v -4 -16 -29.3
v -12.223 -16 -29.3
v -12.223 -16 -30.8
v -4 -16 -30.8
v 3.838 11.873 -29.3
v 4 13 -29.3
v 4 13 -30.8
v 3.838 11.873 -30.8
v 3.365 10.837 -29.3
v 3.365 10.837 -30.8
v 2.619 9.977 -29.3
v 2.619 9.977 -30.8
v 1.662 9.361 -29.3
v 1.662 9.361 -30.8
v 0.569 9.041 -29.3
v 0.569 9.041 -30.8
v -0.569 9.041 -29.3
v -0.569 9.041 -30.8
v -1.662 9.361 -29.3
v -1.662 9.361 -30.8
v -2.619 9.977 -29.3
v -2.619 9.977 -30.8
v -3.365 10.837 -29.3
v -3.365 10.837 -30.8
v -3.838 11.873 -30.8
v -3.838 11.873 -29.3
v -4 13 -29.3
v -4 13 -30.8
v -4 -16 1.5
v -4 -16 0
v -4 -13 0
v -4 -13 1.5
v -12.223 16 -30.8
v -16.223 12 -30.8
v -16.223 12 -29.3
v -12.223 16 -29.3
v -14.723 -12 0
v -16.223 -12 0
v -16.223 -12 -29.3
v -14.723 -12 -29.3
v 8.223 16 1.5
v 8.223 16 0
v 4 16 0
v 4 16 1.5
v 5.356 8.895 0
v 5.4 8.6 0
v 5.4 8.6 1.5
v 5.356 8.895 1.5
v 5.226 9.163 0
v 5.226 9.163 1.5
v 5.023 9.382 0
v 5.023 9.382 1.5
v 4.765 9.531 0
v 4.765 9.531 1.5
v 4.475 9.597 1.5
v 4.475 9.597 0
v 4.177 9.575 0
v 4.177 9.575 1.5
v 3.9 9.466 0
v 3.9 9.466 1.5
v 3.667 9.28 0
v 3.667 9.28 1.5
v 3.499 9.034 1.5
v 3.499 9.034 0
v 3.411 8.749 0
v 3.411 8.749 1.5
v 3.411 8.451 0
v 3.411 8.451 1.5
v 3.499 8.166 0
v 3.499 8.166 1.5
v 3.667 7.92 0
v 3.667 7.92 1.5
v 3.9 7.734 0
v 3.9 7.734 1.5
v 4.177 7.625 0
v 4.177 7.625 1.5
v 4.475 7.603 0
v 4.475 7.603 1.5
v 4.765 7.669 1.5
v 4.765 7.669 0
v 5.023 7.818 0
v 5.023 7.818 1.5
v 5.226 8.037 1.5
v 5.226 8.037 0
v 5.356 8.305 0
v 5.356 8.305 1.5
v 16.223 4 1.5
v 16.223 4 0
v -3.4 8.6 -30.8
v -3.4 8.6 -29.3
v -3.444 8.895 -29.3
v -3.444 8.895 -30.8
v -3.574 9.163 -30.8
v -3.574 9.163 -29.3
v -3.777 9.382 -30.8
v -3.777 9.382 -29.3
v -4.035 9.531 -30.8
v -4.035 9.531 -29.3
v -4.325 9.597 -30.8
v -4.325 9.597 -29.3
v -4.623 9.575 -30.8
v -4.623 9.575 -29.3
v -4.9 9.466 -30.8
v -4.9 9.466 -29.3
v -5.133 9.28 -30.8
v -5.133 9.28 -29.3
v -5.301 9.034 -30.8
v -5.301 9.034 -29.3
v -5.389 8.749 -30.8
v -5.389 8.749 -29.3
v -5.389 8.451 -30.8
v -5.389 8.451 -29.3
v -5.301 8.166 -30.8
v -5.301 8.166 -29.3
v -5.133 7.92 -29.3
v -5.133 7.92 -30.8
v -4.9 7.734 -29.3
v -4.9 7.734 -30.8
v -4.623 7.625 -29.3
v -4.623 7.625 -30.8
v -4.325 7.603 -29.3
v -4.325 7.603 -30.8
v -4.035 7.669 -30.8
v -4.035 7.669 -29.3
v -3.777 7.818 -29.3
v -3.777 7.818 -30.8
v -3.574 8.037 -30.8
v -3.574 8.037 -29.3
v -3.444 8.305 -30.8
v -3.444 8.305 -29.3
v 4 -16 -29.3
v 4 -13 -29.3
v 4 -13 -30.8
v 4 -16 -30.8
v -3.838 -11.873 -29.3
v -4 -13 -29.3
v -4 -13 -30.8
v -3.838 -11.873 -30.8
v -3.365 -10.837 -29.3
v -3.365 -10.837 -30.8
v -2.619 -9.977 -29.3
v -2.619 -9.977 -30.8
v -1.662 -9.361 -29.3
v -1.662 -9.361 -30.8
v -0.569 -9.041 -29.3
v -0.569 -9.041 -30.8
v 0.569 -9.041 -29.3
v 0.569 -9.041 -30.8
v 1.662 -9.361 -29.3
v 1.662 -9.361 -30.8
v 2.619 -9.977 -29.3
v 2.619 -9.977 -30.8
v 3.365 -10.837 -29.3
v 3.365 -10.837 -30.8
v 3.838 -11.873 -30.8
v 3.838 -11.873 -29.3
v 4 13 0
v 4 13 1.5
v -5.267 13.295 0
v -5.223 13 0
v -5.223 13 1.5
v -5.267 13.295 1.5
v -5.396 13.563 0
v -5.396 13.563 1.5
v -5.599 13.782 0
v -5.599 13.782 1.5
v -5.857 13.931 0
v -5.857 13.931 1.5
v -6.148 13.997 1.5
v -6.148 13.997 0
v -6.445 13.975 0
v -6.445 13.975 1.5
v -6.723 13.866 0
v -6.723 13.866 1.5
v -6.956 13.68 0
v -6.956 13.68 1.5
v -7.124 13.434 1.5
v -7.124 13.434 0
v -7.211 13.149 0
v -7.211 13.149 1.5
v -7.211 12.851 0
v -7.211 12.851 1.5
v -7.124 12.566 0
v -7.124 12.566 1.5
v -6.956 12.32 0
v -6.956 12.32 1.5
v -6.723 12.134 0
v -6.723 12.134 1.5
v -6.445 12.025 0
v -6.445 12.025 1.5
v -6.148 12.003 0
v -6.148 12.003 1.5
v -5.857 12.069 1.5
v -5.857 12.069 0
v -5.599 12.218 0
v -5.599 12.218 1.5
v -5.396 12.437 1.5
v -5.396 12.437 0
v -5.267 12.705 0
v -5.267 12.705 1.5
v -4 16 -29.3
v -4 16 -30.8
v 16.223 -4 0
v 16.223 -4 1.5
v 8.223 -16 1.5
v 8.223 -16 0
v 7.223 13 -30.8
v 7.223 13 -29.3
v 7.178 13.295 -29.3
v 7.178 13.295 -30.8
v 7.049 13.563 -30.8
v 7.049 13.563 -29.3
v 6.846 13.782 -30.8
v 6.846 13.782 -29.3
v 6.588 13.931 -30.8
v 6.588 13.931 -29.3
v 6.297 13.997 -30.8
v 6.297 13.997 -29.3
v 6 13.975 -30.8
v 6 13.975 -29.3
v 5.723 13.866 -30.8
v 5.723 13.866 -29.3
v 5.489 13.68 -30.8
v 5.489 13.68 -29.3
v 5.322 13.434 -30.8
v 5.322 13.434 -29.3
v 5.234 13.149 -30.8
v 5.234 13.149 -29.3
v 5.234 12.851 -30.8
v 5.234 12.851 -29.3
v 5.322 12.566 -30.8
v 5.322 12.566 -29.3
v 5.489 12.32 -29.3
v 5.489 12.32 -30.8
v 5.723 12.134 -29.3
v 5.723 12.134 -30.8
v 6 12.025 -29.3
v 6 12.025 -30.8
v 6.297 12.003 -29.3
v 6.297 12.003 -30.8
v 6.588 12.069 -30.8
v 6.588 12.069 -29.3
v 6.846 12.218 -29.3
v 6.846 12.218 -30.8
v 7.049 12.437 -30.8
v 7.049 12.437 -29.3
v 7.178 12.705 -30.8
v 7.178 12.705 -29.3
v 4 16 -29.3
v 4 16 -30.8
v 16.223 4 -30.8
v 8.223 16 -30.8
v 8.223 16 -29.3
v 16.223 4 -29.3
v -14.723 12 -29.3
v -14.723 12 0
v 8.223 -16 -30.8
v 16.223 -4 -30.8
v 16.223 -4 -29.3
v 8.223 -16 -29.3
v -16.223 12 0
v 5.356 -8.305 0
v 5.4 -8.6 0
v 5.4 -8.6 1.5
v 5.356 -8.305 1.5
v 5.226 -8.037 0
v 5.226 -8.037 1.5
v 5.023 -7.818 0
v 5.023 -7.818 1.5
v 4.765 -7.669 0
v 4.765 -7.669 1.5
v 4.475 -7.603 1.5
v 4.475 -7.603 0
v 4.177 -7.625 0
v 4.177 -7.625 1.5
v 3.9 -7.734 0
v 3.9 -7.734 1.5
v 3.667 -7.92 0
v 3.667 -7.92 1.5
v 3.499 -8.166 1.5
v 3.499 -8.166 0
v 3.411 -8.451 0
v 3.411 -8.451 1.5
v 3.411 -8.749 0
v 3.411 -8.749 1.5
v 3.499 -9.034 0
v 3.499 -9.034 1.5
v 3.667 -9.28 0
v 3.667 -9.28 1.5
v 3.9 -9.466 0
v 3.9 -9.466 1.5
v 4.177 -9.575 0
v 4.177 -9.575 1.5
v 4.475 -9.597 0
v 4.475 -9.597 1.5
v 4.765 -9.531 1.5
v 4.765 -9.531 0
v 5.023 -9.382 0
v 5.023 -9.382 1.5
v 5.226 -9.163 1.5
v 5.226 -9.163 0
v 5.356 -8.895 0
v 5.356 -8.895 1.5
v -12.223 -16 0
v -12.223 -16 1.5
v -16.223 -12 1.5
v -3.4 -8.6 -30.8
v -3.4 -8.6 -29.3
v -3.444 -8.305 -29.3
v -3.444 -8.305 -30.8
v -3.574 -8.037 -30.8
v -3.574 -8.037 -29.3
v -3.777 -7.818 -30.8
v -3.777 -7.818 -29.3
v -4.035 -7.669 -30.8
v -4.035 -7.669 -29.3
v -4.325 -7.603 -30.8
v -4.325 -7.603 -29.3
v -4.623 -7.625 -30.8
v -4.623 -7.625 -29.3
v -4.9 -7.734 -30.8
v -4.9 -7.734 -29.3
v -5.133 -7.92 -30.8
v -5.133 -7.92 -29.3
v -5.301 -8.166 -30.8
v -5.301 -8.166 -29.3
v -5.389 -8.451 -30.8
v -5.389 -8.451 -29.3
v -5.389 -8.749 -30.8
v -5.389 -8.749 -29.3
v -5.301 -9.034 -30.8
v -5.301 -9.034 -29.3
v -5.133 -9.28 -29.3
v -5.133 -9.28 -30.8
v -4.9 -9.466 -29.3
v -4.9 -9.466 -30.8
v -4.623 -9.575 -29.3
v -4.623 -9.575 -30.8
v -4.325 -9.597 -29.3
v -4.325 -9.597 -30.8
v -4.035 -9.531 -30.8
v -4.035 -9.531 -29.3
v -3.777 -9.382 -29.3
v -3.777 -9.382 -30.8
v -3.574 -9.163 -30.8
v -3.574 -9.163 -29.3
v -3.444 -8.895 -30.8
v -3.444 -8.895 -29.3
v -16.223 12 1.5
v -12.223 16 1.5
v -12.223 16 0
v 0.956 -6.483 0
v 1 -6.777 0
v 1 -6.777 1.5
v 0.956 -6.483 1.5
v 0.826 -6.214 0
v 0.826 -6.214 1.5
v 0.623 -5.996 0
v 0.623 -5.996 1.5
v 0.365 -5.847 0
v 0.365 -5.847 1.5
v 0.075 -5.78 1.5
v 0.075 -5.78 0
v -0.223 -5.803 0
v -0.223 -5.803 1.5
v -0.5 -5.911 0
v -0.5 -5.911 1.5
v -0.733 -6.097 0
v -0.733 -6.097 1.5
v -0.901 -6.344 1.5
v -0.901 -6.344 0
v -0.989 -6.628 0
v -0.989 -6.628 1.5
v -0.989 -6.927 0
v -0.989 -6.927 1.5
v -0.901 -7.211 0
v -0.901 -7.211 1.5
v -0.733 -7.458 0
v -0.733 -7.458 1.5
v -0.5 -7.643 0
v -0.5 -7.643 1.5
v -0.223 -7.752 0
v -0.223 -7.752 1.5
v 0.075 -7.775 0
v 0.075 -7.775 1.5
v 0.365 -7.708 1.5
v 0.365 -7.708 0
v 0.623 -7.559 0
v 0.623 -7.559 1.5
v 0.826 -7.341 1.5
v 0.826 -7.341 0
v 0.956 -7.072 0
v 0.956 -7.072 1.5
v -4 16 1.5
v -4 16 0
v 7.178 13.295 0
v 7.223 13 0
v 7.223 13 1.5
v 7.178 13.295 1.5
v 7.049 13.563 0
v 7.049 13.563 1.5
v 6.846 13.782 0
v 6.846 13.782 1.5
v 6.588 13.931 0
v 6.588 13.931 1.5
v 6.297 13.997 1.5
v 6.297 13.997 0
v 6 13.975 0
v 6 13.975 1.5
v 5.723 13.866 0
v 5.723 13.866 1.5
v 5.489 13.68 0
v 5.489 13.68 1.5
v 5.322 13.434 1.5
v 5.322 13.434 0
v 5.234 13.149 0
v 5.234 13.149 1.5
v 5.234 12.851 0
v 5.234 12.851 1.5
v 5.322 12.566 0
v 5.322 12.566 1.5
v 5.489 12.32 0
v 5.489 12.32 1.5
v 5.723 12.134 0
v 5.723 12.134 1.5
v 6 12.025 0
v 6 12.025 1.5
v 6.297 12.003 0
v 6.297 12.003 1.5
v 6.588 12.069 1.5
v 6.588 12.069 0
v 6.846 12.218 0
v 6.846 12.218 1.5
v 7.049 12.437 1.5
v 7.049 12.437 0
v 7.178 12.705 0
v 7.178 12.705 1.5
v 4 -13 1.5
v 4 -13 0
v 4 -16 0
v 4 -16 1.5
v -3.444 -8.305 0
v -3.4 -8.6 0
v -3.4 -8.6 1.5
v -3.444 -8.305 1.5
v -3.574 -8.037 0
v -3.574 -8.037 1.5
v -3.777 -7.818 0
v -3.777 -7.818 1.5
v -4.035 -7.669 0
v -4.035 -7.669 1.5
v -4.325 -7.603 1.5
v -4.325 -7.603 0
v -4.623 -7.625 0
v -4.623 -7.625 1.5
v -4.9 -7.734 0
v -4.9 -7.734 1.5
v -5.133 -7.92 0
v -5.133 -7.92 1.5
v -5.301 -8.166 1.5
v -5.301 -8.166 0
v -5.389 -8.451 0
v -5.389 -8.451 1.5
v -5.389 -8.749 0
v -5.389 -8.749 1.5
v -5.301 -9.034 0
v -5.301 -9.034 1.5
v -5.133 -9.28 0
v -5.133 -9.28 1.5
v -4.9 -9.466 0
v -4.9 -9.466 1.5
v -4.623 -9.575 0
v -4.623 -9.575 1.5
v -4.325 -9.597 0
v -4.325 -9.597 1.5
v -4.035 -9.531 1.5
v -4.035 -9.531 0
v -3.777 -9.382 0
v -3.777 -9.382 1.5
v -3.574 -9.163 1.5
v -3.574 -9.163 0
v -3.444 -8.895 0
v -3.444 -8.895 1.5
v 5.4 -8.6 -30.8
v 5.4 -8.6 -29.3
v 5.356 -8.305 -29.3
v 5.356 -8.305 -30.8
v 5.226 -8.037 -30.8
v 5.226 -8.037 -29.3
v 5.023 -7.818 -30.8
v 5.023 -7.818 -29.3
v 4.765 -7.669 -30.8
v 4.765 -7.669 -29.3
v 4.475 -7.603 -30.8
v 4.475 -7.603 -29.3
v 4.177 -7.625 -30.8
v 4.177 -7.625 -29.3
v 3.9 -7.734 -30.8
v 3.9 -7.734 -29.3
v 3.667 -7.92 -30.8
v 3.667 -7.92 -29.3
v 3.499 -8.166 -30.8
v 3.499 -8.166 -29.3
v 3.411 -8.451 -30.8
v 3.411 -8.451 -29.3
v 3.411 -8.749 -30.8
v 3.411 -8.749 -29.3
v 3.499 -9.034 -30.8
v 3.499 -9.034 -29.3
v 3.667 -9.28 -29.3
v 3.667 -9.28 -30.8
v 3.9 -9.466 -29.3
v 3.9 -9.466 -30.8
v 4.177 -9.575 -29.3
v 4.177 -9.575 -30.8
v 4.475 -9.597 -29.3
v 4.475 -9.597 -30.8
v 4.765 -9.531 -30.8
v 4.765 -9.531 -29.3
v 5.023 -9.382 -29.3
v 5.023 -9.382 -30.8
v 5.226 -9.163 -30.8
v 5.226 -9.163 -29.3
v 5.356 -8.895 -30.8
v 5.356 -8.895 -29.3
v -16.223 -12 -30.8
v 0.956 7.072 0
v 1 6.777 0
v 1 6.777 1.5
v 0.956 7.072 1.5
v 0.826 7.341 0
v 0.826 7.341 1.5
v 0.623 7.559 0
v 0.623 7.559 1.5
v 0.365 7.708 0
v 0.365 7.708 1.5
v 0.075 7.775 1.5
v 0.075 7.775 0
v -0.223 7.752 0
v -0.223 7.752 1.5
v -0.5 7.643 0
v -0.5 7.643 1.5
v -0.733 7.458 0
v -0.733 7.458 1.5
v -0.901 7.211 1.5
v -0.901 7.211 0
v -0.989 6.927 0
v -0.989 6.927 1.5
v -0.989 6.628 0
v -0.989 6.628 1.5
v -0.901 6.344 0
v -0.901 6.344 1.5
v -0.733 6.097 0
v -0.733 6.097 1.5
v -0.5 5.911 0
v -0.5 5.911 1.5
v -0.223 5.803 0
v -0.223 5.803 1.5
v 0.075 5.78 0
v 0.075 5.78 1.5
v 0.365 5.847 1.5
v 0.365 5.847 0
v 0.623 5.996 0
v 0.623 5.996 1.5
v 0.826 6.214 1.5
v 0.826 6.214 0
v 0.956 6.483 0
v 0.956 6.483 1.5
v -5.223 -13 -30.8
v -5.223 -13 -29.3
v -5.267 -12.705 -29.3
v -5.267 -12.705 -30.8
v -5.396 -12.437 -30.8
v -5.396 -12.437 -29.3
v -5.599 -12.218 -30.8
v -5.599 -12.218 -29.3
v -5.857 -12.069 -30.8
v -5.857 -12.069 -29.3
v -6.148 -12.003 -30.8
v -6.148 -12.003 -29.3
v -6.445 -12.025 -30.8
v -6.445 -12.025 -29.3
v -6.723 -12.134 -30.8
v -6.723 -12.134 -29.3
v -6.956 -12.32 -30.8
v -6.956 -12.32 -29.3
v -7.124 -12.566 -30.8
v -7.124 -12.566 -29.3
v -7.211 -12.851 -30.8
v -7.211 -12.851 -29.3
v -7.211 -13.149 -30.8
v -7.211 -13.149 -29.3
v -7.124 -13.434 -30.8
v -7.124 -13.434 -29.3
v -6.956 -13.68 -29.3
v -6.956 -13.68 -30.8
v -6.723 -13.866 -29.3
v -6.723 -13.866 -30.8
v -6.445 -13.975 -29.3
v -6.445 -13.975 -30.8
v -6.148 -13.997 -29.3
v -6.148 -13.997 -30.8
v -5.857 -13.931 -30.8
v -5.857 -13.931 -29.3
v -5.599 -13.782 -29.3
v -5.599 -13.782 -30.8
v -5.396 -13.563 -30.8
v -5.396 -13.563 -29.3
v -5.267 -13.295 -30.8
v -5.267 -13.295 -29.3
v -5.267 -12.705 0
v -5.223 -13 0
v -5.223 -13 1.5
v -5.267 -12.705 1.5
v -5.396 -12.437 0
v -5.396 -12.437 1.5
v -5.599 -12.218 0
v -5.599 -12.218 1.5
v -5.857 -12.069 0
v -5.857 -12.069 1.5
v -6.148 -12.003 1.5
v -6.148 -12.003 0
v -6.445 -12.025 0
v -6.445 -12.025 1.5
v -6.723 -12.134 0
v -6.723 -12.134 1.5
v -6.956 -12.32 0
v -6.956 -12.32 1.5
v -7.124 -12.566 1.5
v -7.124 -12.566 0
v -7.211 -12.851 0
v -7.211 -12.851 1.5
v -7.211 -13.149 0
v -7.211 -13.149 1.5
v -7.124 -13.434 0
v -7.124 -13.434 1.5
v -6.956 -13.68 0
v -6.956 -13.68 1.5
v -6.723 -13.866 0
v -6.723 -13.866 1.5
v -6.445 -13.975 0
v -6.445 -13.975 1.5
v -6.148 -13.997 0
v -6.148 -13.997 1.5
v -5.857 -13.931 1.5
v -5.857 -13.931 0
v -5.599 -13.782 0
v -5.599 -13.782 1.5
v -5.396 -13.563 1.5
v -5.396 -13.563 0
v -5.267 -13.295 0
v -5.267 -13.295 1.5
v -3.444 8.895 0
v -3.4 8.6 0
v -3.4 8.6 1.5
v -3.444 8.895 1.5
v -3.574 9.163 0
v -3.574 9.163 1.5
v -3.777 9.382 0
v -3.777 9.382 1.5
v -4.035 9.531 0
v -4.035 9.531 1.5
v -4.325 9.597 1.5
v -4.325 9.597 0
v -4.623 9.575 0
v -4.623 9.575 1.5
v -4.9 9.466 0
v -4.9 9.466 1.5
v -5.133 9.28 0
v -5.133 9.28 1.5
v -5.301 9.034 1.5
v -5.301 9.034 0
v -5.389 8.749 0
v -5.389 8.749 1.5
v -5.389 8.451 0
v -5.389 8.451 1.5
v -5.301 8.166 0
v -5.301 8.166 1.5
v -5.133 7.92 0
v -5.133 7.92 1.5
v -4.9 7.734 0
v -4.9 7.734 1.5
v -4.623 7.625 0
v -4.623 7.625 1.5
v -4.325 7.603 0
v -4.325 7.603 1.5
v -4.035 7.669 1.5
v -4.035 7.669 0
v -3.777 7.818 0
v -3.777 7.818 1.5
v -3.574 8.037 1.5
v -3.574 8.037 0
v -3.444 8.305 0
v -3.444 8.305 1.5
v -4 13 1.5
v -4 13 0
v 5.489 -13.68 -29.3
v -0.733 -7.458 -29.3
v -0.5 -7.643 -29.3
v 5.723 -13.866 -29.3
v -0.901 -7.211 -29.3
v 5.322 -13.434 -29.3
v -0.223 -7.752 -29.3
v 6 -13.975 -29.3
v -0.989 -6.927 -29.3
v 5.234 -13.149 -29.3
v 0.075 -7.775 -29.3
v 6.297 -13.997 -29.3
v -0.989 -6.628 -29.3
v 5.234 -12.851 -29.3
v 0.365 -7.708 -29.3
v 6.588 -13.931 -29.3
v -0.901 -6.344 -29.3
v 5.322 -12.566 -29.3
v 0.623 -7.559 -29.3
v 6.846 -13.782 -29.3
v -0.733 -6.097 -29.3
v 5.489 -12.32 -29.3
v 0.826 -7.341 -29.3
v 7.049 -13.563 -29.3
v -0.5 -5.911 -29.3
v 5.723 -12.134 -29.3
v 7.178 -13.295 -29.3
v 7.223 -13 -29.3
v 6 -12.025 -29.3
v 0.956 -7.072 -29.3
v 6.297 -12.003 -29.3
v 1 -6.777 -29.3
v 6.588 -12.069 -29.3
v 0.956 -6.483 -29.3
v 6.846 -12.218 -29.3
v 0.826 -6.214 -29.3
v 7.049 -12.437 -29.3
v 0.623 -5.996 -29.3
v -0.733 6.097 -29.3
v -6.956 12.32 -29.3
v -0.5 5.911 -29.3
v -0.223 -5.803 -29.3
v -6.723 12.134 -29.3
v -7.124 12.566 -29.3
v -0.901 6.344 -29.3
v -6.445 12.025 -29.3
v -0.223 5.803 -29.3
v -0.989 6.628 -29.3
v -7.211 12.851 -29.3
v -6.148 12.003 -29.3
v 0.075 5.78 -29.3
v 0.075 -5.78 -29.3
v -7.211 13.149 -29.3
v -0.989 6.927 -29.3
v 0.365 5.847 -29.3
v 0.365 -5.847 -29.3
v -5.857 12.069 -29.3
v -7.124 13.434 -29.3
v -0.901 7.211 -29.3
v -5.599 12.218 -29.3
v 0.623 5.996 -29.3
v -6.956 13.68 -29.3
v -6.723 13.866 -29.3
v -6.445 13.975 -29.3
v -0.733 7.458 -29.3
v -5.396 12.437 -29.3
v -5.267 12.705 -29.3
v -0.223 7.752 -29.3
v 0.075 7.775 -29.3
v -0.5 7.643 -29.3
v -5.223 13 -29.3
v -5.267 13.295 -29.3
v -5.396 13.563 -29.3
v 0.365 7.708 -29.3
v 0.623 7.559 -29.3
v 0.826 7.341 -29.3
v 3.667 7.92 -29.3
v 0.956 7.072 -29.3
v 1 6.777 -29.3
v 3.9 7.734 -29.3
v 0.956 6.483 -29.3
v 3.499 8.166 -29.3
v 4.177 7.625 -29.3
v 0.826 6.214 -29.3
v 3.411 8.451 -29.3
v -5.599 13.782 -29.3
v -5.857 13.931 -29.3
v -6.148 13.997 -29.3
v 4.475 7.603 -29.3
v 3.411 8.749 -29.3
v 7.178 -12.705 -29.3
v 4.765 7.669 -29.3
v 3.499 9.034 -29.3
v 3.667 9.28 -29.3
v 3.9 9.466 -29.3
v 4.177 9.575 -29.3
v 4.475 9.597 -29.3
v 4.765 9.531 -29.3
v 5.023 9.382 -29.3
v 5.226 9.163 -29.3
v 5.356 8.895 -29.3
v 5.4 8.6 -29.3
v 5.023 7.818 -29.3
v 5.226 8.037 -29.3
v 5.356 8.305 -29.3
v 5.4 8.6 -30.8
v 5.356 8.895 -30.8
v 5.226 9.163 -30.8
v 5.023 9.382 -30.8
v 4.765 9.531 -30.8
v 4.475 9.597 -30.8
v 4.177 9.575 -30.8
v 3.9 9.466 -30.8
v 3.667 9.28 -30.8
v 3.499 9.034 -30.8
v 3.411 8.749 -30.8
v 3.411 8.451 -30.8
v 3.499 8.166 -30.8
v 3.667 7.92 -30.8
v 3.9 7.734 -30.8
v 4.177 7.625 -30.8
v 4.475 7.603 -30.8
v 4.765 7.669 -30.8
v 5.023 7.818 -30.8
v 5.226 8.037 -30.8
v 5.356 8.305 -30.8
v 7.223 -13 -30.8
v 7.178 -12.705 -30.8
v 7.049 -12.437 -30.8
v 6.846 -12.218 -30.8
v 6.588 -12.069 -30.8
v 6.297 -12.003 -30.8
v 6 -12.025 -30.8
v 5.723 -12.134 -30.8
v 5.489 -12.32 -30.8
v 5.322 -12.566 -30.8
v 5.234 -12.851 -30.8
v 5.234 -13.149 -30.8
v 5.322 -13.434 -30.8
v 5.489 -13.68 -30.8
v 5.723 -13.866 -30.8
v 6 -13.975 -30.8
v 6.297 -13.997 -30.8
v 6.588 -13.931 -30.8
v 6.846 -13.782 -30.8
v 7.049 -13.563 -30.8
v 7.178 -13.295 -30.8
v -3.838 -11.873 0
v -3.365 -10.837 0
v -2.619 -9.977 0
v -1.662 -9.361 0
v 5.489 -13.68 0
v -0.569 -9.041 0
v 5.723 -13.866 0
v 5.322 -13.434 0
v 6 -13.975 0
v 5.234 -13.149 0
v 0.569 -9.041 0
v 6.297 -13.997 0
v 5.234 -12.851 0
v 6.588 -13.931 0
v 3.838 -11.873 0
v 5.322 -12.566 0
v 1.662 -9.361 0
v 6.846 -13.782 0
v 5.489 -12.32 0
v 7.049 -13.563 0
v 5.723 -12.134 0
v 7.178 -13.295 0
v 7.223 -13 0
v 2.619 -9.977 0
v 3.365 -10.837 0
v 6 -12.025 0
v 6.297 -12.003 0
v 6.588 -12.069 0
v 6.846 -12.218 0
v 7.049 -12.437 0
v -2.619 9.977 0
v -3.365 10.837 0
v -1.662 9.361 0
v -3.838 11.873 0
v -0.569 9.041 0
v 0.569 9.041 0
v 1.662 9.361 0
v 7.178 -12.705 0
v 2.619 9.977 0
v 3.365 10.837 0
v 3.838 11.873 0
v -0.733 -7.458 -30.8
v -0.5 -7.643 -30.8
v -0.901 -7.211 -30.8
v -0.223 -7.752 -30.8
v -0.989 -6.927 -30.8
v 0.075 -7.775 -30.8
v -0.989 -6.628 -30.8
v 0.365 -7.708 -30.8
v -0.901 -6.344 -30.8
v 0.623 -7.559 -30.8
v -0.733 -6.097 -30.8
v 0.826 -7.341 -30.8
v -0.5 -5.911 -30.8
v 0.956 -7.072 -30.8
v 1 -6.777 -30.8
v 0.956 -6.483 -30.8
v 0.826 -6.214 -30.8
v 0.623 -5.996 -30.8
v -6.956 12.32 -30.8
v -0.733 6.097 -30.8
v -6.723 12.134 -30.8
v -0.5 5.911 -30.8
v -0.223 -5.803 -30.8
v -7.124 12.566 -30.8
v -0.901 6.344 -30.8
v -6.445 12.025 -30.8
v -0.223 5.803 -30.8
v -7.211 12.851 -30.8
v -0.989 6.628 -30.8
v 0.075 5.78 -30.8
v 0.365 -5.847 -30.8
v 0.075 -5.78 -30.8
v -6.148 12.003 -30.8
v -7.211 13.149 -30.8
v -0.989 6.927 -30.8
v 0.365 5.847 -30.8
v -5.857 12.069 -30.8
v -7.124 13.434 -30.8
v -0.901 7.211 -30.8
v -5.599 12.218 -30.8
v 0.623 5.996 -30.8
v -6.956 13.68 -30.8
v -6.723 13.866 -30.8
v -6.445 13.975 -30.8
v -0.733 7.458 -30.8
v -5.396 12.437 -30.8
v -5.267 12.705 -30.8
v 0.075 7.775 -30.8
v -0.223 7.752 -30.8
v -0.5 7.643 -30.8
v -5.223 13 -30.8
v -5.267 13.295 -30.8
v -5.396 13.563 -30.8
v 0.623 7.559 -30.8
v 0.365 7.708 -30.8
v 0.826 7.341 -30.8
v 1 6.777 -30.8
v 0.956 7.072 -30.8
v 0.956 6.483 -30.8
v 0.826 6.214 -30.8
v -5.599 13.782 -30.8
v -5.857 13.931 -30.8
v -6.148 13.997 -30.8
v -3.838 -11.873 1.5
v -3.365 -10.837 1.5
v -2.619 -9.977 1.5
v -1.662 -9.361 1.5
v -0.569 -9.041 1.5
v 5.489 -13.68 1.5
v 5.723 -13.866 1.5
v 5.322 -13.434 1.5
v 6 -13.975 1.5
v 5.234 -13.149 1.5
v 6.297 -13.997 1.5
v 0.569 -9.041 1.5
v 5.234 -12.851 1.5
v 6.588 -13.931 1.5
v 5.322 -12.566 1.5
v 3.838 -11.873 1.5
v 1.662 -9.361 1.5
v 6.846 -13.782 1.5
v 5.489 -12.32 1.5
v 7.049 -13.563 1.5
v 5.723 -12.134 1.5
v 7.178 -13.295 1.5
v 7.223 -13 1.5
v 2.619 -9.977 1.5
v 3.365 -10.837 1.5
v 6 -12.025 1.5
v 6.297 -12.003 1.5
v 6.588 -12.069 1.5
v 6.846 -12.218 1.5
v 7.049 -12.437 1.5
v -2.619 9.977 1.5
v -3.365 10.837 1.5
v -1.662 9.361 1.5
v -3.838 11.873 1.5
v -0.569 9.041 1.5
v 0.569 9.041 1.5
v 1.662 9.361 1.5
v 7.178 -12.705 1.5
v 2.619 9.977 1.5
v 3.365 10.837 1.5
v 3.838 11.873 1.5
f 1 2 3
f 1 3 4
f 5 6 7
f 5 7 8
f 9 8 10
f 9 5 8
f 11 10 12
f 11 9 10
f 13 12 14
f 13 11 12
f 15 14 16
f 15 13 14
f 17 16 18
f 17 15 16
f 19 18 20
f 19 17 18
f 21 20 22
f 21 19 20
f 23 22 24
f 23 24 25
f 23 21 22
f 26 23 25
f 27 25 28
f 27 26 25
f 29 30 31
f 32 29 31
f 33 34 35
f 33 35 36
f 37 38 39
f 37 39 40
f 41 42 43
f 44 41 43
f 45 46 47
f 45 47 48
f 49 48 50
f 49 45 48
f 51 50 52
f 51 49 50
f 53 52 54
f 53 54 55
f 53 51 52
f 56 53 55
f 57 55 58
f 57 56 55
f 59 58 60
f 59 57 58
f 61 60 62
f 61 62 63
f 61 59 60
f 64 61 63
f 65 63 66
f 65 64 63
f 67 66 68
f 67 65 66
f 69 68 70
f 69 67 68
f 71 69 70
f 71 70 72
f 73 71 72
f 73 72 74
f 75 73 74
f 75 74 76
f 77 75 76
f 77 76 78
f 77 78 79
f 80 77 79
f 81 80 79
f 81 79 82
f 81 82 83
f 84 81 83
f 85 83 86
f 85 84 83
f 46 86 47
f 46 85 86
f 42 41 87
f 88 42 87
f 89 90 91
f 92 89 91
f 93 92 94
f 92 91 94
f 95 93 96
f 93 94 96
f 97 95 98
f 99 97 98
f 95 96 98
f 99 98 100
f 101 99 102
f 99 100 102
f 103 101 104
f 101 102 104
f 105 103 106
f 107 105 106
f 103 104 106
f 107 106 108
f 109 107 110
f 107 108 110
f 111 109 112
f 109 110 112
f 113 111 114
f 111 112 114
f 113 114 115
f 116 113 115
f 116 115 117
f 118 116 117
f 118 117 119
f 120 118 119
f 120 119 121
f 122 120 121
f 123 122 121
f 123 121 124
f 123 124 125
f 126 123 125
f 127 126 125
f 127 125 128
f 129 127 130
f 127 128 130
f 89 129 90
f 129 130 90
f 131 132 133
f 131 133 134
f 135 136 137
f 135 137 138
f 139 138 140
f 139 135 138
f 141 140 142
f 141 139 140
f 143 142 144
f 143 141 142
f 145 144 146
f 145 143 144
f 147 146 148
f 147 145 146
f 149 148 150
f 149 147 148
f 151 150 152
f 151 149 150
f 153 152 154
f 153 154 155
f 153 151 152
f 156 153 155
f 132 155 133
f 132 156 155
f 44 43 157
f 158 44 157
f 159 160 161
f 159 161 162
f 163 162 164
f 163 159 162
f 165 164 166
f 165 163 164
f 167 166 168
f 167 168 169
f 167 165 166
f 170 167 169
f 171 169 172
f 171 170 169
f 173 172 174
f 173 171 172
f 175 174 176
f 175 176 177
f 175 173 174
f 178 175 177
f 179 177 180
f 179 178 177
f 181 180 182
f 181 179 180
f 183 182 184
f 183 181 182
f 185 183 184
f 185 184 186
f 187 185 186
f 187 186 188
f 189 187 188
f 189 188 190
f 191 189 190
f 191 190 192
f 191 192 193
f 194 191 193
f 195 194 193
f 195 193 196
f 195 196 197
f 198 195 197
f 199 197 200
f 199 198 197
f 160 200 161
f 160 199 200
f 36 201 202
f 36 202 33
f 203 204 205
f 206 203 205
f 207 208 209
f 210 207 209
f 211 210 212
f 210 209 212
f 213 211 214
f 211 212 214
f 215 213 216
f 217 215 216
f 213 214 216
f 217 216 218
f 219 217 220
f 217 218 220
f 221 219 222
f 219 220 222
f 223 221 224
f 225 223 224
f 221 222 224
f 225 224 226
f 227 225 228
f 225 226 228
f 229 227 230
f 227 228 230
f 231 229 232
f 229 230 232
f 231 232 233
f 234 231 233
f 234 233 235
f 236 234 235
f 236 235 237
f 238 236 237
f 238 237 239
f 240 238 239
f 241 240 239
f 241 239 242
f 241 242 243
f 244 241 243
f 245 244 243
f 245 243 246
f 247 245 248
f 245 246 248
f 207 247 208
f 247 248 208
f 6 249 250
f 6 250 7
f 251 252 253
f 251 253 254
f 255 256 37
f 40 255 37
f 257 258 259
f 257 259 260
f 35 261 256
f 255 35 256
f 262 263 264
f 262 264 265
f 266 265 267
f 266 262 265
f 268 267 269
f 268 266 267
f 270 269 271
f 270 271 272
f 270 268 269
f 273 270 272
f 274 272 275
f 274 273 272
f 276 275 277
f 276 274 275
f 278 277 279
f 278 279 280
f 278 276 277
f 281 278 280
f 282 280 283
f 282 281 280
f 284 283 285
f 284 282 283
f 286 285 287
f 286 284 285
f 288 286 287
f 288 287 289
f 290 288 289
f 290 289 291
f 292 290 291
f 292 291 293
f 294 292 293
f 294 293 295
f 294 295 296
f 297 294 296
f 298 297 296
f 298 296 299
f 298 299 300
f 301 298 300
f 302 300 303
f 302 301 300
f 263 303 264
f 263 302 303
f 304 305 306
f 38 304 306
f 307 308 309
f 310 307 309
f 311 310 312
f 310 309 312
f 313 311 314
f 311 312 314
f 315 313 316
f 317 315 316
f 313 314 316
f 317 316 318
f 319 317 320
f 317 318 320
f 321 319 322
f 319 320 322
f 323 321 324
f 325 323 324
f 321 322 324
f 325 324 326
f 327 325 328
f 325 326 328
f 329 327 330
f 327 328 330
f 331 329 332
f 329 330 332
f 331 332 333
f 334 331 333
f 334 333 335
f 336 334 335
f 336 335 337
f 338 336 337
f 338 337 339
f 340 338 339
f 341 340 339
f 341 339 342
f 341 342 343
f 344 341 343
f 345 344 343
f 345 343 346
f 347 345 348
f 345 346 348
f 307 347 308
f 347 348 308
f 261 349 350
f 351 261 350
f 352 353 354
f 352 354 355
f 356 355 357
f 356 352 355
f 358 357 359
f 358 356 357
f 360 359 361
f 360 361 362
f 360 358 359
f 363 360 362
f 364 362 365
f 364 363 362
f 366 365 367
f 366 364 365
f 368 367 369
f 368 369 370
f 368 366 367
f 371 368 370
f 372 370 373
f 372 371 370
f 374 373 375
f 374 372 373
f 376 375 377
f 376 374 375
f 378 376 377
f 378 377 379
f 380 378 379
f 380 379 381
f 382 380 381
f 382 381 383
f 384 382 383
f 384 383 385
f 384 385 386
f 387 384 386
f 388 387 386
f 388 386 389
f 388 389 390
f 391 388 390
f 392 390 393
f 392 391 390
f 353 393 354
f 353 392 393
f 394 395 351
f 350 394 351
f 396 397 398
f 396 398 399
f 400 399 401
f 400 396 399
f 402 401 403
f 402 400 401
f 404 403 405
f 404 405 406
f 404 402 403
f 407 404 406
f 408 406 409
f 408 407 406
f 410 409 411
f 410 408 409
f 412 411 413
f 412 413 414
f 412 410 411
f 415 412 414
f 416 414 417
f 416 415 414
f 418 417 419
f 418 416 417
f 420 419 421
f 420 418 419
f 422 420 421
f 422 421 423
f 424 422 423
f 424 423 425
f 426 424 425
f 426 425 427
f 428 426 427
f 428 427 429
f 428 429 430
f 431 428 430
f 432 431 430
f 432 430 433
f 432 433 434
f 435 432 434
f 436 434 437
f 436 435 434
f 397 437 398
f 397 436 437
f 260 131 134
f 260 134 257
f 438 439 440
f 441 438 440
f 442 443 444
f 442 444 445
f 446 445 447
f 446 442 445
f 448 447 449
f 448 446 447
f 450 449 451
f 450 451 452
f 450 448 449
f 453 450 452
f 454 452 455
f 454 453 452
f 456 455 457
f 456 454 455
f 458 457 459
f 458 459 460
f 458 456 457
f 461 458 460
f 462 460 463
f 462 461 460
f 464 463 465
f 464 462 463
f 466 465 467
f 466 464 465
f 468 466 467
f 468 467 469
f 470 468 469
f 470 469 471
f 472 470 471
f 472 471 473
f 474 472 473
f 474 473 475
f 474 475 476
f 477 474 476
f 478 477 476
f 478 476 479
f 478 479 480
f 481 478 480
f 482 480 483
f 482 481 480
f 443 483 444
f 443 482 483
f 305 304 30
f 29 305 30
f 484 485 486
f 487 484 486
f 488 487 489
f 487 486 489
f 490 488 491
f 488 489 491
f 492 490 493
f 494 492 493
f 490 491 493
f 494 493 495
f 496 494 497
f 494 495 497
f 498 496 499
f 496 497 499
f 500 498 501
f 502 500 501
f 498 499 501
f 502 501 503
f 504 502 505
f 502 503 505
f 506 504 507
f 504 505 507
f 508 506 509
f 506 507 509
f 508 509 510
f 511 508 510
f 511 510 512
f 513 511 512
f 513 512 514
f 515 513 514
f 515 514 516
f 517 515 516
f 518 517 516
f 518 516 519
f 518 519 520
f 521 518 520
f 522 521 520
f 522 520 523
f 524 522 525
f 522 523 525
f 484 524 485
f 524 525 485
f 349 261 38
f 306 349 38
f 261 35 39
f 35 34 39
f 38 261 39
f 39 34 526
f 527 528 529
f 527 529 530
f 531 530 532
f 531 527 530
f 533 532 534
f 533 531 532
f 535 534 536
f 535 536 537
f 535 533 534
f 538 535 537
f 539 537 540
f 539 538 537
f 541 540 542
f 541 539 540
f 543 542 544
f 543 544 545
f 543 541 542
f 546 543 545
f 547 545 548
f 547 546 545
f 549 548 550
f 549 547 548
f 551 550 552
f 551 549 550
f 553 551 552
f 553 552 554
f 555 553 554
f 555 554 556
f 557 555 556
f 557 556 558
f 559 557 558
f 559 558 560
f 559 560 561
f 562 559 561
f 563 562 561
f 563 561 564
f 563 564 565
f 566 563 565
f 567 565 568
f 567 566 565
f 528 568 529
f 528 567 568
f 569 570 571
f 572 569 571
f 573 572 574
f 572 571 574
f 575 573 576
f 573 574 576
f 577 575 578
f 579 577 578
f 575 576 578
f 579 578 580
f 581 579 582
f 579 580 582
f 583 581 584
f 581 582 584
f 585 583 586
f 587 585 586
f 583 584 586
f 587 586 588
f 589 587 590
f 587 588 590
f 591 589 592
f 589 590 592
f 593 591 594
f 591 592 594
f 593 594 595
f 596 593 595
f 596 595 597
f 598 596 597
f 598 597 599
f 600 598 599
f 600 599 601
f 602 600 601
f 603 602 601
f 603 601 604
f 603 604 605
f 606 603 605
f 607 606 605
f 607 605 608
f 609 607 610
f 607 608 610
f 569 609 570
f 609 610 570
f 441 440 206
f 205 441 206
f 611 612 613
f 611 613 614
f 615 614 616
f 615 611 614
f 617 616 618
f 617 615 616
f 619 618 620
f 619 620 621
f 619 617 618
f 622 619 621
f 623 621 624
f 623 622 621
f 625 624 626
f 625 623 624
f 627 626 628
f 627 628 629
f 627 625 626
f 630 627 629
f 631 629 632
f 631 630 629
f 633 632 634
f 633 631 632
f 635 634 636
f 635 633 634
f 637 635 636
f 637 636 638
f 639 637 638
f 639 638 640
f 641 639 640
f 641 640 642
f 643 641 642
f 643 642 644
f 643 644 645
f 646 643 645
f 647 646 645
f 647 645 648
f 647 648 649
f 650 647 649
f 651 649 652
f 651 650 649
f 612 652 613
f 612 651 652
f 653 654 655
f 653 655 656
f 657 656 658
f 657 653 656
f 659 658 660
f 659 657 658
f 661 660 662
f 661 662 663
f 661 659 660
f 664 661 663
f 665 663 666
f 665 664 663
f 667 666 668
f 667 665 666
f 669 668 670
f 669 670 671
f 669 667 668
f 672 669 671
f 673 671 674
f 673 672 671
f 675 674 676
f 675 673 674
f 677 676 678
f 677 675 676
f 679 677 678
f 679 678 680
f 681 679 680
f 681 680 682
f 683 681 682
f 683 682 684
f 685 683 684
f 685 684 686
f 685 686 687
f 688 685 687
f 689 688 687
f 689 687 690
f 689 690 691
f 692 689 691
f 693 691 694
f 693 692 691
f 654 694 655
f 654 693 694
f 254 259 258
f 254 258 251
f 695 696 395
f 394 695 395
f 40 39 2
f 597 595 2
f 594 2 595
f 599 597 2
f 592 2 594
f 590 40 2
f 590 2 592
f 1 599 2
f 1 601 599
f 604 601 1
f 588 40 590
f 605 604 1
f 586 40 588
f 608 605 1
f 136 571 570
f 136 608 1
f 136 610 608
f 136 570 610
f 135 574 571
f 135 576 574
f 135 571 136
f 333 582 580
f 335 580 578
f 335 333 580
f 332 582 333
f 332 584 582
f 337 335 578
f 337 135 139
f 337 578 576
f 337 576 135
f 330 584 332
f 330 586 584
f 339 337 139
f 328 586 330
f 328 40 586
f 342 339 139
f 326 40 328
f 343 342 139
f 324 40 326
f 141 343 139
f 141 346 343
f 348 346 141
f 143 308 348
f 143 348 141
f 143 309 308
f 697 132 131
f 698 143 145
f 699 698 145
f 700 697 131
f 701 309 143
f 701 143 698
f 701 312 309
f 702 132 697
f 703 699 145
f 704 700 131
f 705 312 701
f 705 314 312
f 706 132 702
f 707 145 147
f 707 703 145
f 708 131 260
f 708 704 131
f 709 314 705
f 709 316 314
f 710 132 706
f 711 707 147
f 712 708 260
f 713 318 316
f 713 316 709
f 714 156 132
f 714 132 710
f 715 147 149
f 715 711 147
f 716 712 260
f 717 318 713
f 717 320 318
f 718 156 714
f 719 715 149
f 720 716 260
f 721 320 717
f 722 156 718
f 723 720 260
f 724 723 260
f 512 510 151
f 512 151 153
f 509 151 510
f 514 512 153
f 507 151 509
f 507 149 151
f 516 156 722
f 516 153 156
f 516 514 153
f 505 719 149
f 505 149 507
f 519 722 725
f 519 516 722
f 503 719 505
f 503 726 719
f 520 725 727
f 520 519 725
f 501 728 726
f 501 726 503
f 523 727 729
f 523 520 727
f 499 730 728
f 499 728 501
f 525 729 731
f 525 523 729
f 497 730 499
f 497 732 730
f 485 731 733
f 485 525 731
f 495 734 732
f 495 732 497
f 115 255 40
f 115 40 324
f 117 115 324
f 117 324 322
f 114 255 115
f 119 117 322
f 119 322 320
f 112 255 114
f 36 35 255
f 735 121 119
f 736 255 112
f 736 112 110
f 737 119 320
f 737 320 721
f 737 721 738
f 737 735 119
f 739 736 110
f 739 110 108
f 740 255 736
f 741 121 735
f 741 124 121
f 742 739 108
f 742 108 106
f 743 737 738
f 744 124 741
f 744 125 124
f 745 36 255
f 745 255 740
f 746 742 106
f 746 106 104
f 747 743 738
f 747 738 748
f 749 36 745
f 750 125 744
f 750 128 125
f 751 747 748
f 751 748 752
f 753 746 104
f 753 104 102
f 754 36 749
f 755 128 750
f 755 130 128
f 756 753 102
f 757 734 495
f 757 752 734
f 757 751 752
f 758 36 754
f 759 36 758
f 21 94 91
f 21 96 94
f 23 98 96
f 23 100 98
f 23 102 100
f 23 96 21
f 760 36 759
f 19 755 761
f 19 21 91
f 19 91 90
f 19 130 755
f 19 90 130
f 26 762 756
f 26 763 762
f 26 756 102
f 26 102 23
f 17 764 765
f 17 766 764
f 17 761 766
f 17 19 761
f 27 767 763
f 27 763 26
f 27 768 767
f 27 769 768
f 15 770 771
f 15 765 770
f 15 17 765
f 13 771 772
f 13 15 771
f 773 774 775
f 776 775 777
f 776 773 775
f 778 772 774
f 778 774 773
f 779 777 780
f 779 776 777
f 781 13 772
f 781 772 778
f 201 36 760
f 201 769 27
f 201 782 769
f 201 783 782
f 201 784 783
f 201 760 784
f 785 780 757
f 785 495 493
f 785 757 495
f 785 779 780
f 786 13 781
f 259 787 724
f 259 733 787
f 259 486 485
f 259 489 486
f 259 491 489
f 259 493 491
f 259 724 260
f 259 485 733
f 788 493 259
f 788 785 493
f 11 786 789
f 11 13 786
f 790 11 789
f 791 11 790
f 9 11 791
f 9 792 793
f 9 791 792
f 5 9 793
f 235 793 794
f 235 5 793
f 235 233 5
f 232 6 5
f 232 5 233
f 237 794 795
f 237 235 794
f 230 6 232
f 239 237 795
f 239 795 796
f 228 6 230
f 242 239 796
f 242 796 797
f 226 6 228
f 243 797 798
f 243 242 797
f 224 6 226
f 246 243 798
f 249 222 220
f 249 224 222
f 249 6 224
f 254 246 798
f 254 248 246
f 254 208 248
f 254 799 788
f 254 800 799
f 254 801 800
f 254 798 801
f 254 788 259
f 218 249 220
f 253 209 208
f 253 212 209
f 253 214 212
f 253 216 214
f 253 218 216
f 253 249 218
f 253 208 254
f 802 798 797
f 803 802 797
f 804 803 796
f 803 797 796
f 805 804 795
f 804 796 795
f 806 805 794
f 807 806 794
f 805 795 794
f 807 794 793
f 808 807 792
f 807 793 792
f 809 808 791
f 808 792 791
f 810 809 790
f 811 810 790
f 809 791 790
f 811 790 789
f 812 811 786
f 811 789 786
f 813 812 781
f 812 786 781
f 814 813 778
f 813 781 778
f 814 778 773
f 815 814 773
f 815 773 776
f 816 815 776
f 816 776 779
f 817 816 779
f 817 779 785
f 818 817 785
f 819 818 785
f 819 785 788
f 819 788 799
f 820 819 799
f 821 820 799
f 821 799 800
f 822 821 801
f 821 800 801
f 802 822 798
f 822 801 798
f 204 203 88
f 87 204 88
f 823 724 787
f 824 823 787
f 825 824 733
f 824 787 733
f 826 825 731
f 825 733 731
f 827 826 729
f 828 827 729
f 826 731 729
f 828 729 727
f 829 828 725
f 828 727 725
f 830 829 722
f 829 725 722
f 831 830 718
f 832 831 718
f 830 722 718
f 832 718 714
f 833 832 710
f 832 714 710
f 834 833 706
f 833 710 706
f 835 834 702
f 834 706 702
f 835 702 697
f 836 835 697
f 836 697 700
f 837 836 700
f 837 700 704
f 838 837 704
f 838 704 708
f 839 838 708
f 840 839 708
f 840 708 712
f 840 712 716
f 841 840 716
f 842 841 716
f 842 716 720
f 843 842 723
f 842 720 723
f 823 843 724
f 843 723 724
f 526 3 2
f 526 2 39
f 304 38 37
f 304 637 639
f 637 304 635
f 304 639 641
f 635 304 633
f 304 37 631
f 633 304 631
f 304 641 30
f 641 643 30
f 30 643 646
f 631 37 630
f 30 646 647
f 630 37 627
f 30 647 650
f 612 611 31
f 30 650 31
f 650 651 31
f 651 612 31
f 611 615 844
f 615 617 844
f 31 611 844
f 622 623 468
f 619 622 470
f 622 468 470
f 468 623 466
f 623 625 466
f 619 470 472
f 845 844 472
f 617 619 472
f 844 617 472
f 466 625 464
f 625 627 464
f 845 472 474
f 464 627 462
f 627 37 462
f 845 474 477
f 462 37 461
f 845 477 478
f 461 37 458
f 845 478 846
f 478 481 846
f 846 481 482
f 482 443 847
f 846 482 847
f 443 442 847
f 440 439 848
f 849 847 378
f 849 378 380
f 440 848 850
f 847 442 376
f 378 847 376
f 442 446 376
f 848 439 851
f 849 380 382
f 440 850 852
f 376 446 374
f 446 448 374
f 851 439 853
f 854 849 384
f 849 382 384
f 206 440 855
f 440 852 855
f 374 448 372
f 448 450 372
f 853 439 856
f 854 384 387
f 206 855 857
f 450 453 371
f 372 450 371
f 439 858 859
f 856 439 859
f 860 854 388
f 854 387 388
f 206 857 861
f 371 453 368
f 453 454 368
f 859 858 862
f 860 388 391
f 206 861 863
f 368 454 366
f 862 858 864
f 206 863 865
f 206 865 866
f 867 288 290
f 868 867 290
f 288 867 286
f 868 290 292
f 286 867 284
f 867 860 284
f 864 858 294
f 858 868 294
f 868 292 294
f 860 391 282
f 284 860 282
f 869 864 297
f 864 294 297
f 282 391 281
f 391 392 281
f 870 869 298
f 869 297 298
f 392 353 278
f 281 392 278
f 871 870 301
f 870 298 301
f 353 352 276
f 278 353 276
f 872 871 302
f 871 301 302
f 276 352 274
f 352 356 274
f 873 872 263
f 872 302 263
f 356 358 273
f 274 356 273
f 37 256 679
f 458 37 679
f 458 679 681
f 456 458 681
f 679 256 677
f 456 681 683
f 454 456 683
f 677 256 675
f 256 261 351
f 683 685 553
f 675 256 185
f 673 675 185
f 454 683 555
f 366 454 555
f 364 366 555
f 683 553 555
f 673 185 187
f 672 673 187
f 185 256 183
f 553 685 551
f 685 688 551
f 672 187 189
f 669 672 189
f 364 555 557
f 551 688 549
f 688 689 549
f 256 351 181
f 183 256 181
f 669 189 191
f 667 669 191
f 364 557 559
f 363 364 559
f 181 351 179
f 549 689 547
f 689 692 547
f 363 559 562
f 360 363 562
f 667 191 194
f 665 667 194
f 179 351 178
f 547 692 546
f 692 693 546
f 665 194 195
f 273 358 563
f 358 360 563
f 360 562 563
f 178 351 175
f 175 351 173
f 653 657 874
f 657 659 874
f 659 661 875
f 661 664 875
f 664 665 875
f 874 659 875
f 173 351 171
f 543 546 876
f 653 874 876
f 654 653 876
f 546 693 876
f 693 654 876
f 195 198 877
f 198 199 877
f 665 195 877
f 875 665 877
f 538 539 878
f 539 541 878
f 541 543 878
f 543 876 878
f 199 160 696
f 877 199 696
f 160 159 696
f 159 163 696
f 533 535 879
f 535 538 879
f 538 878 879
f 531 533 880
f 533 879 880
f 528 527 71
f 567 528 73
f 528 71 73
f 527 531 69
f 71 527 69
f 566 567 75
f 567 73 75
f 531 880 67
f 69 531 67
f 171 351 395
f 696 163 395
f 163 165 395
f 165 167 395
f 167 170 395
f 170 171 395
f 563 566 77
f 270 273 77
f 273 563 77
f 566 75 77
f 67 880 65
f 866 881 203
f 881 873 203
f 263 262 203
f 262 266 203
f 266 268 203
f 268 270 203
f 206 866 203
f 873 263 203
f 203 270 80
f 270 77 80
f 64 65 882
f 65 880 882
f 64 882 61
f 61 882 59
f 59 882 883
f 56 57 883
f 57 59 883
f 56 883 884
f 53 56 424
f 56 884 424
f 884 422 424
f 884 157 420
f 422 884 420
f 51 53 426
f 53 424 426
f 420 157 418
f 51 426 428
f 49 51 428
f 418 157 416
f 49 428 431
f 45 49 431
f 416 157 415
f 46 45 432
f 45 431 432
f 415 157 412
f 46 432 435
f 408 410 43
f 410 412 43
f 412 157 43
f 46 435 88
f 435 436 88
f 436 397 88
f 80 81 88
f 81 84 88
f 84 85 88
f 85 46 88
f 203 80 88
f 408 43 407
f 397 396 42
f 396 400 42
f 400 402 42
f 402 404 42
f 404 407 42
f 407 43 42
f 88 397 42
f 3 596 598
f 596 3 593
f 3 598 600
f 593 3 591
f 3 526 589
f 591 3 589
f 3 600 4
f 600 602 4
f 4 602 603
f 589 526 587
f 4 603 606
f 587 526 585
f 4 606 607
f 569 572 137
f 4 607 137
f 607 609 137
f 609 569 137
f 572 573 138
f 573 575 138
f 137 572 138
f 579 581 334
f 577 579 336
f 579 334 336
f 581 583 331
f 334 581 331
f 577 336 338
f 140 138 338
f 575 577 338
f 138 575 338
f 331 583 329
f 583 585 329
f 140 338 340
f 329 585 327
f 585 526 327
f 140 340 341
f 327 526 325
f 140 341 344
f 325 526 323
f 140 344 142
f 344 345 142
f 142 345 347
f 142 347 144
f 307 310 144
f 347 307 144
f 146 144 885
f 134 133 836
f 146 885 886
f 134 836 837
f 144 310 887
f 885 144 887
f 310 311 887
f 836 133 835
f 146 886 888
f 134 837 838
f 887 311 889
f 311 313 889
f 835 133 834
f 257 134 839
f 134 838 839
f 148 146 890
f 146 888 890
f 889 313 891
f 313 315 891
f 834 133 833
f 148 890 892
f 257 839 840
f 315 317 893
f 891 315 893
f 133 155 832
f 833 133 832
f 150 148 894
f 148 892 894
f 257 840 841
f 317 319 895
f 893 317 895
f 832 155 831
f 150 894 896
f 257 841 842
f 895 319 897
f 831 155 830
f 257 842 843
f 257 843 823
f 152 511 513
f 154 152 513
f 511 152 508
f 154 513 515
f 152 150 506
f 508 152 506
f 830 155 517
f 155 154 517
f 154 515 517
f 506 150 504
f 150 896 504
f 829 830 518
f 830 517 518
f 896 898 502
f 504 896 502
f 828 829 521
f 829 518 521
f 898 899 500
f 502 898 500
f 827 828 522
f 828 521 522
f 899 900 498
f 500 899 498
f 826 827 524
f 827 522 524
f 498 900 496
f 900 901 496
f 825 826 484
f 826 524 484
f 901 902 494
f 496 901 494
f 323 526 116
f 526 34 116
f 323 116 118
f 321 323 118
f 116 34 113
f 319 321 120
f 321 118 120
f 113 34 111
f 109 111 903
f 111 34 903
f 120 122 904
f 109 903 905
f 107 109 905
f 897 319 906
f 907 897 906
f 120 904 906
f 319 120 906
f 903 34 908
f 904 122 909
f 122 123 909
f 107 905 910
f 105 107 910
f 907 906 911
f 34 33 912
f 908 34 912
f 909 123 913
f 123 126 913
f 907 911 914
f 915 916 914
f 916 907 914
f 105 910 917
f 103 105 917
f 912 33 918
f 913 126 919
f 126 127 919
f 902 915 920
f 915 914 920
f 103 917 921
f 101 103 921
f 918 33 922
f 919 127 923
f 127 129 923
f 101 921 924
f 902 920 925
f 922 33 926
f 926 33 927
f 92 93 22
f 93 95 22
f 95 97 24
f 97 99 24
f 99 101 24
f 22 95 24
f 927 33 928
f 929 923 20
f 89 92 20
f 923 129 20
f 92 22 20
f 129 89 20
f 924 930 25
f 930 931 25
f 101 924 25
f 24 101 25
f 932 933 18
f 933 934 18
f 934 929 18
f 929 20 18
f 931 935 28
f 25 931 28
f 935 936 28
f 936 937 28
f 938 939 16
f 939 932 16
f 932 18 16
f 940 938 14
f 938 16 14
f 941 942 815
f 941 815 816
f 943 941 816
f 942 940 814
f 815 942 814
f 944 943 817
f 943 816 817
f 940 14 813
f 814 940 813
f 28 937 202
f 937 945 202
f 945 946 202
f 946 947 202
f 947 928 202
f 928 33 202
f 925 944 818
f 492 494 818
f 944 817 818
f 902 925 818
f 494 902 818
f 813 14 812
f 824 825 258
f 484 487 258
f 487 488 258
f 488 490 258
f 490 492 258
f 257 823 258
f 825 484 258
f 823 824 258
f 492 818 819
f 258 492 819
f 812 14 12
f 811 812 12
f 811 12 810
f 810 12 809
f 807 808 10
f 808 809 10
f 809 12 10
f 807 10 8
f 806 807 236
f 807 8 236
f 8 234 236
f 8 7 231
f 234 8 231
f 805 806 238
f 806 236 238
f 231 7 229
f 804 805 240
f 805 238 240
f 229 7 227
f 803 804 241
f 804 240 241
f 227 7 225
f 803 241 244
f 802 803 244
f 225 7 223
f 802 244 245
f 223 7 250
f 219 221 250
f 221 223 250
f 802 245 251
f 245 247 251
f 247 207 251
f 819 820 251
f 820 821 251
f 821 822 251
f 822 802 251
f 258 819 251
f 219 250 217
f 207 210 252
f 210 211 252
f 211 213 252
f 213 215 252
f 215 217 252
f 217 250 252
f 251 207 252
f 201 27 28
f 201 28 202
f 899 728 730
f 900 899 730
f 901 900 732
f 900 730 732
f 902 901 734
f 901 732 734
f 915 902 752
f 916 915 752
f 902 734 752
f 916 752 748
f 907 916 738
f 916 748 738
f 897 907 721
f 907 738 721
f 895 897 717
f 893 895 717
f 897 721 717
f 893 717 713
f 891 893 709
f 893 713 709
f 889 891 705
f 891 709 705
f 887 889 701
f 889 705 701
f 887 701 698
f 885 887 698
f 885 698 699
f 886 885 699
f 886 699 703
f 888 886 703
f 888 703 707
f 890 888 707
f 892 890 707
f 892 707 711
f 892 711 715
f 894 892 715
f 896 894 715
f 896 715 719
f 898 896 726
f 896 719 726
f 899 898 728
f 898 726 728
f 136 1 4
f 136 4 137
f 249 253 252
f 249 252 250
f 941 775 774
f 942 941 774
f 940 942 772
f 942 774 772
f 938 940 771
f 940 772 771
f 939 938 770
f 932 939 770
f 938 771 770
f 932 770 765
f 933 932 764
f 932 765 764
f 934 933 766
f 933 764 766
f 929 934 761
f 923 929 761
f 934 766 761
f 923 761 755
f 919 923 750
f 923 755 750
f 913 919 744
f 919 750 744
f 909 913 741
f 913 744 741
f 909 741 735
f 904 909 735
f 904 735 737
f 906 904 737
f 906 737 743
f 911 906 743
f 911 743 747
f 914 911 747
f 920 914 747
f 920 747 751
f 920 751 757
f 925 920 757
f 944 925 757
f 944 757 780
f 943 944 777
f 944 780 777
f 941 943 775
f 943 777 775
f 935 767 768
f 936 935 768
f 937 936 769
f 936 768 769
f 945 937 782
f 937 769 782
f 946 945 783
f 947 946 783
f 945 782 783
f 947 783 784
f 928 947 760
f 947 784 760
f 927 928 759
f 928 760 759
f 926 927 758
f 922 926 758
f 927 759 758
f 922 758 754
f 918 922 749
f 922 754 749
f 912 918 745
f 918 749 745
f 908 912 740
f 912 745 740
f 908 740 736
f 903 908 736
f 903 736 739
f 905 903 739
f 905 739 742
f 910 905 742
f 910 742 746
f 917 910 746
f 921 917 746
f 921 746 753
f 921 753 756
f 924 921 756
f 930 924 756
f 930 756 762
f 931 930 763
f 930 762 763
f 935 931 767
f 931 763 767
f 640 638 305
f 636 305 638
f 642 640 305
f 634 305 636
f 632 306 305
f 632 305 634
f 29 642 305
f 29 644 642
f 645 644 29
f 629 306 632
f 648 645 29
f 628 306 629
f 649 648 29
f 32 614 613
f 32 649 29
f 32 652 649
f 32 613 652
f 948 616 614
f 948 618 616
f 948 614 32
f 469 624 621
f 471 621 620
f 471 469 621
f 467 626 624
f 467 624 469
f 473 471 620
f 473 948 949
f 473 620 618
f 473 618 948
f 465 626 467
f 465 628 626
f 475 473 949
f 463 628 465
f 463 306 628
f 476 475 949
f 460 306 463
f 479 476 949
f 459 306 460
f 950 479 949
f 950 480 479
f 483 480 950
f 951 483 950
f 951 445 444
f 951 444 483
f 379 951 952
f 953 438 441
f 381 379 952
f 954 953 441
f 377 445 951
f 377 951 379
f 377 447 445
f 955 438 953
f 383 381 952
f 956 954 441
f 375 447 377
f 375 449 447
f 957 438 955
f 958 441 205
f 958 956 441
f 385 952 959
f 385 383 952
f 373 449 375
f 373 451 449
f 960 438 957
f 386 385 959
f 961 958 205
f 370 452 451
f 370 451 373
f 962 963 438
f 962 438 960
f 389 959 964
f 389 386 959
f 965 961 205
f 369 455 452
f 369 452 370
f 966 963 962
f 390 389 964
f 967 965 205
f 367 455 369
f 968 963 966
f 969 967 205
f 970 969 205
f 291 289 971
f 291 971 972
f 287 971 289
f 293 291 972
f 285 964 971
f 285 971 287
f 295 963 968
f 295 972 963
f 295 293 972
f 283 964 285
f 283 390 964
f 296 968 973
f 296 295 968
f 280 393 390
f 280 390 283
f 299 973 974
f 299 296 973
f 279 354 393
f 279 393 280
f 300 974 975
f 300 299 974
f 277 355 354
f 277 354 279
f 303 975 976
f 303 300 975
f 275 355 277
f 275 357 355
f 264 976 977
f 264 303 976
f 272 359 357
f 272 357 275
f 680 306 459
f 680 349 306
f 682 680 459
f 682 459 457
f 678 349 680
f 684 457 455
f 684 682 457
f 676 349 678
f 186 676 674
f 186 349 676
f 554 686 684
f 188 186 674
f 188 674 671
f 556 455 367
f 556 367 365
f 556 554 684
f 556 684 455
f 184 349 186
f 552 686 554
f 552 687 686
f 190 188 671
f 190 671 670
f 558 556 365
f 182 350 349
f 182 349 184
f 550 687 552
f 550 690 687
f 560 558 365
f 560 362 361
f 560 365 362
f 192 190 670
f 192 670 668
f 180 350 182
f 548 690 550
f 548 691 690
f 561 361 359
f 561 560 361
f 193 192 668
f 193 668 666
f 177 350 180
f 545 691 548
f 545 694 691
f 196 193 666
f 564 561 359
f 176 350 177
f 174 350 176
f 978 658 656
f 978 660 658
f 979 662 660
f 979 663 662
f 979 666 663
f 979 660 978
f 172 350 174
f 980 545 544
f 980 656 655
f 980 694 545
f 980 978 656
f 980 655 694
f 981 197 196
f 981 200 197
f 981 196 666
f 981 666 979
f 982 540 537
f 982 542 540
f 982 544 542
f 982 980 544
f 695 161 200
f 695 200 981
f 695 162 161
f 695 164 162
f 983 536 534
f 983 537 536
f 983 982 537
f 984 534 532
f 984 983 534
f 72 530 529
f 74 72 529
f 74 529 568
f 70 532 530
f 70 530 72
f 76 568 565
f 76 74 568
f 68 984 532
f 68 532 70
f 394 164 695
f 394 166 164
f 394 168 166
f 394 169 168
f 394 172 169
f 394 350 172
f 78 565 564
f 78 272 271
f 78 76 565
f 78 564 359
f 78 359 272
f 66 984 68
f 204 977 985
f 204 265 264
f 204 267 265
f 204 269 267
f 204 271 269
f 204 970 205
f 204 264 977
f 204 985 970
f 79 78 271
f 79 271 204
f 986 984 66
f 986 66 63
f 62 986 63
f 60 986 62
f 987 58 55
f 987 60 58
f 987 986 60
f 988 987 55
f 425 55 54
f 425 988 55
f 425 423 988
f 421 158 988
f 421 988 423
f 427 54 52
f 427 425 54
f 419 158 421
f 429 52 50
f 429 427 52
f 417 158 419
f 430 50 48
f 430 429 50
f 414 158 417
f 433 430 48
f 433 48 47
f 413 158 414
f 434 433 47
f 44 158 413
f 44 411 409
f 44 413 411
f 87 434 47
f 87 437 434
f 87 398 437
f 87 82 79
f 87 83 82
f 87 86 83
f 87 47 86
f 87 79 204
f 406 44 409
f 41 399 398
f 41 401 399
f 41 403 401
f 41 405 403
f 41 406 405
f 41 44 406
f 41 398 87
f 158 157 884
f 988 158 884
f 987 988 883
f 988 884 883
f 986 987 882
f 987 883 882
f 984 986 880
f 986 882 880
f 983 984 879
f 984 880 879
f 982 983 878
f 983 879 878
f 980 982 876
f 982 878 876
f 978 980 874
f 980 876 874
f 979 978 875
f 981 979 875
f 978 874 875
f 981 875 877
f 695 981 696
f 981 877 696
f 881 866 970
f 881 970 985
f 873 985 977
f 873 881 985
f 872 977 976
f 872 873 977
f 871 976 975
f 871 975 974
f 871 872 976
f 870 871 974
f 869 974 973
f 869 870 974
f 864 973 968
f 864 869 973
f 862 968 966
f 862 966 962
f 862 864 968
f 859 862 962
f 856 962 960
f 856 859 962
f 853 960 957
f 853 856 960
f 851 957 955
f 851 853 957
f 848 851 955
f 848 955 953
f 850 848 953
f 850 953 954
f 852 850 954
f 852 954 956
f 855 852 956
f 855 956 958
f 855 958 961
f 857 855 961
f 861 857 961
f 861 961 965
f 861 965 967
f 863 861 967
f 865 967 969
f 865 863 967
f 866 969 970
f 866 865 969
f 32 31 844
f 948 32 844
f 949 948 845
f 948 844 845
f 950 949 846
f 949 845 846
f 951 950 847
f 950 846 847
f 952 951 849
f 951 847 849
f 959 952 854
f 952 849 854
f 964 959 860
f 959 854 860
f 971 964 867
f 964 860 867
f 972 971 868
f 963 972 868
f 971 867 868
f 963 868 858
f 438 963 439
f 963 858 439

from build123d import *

# Parameters (mm, degrees)
F0_R     = 1
F1_DEPTH = 1.5
F3_DEPTH = 1.5
F4_W     = 1.5
F4_H     = 24
F5_DEPTH = 14.65


with BuildPart() as f1:
    # F0 (on Top) → F1 (new body)
    with BuildSketch(Plane.XY):
        with BuildLine():
            Line((-4, 16), (-16.22254, 16))
            Line((-16.22254, 16), (-16.22254, -16))
            Line((-16.22254, -16), (-4, -16))
            Line((-4, -16), (-4, -13))
            ThreePointArc((-4, -13), (0, -9), (4, -13))
            Line((4, -13), (4, -16))
            Line((4, -16), (16.22254, -16))
            Line((16.22254, -16), (16.22254, 16))
            Line((16.22254, 16), (4, 16))
            Line((4, 16), (4, 13))
            ThreePointArc((4, 13), (0, 9), (-4, 13))
            Line((-4, 13), (-4, 16))
        make_face()
        with Locations((-6.22254, -13)):
            Circle(F0_R, mode=Mode.SUBTRACT)
        with Locations((-4.4, -8.6)):
            Circle(F0_R, mode=Mode.SUBTRACT)
        with Locations((6.22254, -13)):
            Circle(F0_R, mode=Mode.SUBTRACT)
        with Locations((4.4, -8.6)):
            Circle(F0_R, mode=Mode.SUBTRACT)
        with Locations((0, -6.77746)):
            Circle(F0_R, mode=Mode.SUBTRACT)
        with Locations((-4.4, 8.6)):
            Circle(F0_R, mode=Mode.SUBTRACT)
        with Locations((-6.22254, 13)):
            Circle(F0_R, mode=Mode.SUBTRACT)
        with Locations((0, 6.77746)):
            Circle(F0_R, mode=Mode.SUBTRACT)
        with Locations((4.4, 8.6)):
            Circle(F0_R, mode=Mode.SUBTRACT)
        with Locations((6.22254, 13)):
            Circle(F0_R, mode=Mode.SUBTRACT)
    extrude(amount=F1_DEPTH)

    # F2 (on face) → F3 (cut, through all)
    with BuildSketch(Plane.XY.offset(1.5)):
        Polygon((16.22254, 16), (8.22254, 16), (16.22254, 4), align=None)
        Polygon((8.22254, -16), (16.22254, -16), (16.22254, -4), align=None)
        Polygon((-12.22254, 16), (-16.22254, 16), (-16.22254, 12), align=None)
        Polygon((-16.22254, -16), (-12.22254, -16), (-16.22254, -12), align=None)
    extrude(amount=-F3_DEPTH, mode=Mode.SUBTRACT)

    # F4 (on face) → F5 (join)
    with BuildSketch(Plane(origin=(0, 0, 0), x_dir=(1, 0, 0), z_dir=(0, 0, -1))):
        with Locations((-15.47254, 0)):
            Rectangle(F4_W, F4_H)
    extrude(amount=F5_DEPTH)

    # F7: F1 across plane


with BuildPart() as f1_1:
    add(f1.part)
    add(f1.part.mirror(Plane.XY.offset(-14.65)))


solid = f1_1.part
